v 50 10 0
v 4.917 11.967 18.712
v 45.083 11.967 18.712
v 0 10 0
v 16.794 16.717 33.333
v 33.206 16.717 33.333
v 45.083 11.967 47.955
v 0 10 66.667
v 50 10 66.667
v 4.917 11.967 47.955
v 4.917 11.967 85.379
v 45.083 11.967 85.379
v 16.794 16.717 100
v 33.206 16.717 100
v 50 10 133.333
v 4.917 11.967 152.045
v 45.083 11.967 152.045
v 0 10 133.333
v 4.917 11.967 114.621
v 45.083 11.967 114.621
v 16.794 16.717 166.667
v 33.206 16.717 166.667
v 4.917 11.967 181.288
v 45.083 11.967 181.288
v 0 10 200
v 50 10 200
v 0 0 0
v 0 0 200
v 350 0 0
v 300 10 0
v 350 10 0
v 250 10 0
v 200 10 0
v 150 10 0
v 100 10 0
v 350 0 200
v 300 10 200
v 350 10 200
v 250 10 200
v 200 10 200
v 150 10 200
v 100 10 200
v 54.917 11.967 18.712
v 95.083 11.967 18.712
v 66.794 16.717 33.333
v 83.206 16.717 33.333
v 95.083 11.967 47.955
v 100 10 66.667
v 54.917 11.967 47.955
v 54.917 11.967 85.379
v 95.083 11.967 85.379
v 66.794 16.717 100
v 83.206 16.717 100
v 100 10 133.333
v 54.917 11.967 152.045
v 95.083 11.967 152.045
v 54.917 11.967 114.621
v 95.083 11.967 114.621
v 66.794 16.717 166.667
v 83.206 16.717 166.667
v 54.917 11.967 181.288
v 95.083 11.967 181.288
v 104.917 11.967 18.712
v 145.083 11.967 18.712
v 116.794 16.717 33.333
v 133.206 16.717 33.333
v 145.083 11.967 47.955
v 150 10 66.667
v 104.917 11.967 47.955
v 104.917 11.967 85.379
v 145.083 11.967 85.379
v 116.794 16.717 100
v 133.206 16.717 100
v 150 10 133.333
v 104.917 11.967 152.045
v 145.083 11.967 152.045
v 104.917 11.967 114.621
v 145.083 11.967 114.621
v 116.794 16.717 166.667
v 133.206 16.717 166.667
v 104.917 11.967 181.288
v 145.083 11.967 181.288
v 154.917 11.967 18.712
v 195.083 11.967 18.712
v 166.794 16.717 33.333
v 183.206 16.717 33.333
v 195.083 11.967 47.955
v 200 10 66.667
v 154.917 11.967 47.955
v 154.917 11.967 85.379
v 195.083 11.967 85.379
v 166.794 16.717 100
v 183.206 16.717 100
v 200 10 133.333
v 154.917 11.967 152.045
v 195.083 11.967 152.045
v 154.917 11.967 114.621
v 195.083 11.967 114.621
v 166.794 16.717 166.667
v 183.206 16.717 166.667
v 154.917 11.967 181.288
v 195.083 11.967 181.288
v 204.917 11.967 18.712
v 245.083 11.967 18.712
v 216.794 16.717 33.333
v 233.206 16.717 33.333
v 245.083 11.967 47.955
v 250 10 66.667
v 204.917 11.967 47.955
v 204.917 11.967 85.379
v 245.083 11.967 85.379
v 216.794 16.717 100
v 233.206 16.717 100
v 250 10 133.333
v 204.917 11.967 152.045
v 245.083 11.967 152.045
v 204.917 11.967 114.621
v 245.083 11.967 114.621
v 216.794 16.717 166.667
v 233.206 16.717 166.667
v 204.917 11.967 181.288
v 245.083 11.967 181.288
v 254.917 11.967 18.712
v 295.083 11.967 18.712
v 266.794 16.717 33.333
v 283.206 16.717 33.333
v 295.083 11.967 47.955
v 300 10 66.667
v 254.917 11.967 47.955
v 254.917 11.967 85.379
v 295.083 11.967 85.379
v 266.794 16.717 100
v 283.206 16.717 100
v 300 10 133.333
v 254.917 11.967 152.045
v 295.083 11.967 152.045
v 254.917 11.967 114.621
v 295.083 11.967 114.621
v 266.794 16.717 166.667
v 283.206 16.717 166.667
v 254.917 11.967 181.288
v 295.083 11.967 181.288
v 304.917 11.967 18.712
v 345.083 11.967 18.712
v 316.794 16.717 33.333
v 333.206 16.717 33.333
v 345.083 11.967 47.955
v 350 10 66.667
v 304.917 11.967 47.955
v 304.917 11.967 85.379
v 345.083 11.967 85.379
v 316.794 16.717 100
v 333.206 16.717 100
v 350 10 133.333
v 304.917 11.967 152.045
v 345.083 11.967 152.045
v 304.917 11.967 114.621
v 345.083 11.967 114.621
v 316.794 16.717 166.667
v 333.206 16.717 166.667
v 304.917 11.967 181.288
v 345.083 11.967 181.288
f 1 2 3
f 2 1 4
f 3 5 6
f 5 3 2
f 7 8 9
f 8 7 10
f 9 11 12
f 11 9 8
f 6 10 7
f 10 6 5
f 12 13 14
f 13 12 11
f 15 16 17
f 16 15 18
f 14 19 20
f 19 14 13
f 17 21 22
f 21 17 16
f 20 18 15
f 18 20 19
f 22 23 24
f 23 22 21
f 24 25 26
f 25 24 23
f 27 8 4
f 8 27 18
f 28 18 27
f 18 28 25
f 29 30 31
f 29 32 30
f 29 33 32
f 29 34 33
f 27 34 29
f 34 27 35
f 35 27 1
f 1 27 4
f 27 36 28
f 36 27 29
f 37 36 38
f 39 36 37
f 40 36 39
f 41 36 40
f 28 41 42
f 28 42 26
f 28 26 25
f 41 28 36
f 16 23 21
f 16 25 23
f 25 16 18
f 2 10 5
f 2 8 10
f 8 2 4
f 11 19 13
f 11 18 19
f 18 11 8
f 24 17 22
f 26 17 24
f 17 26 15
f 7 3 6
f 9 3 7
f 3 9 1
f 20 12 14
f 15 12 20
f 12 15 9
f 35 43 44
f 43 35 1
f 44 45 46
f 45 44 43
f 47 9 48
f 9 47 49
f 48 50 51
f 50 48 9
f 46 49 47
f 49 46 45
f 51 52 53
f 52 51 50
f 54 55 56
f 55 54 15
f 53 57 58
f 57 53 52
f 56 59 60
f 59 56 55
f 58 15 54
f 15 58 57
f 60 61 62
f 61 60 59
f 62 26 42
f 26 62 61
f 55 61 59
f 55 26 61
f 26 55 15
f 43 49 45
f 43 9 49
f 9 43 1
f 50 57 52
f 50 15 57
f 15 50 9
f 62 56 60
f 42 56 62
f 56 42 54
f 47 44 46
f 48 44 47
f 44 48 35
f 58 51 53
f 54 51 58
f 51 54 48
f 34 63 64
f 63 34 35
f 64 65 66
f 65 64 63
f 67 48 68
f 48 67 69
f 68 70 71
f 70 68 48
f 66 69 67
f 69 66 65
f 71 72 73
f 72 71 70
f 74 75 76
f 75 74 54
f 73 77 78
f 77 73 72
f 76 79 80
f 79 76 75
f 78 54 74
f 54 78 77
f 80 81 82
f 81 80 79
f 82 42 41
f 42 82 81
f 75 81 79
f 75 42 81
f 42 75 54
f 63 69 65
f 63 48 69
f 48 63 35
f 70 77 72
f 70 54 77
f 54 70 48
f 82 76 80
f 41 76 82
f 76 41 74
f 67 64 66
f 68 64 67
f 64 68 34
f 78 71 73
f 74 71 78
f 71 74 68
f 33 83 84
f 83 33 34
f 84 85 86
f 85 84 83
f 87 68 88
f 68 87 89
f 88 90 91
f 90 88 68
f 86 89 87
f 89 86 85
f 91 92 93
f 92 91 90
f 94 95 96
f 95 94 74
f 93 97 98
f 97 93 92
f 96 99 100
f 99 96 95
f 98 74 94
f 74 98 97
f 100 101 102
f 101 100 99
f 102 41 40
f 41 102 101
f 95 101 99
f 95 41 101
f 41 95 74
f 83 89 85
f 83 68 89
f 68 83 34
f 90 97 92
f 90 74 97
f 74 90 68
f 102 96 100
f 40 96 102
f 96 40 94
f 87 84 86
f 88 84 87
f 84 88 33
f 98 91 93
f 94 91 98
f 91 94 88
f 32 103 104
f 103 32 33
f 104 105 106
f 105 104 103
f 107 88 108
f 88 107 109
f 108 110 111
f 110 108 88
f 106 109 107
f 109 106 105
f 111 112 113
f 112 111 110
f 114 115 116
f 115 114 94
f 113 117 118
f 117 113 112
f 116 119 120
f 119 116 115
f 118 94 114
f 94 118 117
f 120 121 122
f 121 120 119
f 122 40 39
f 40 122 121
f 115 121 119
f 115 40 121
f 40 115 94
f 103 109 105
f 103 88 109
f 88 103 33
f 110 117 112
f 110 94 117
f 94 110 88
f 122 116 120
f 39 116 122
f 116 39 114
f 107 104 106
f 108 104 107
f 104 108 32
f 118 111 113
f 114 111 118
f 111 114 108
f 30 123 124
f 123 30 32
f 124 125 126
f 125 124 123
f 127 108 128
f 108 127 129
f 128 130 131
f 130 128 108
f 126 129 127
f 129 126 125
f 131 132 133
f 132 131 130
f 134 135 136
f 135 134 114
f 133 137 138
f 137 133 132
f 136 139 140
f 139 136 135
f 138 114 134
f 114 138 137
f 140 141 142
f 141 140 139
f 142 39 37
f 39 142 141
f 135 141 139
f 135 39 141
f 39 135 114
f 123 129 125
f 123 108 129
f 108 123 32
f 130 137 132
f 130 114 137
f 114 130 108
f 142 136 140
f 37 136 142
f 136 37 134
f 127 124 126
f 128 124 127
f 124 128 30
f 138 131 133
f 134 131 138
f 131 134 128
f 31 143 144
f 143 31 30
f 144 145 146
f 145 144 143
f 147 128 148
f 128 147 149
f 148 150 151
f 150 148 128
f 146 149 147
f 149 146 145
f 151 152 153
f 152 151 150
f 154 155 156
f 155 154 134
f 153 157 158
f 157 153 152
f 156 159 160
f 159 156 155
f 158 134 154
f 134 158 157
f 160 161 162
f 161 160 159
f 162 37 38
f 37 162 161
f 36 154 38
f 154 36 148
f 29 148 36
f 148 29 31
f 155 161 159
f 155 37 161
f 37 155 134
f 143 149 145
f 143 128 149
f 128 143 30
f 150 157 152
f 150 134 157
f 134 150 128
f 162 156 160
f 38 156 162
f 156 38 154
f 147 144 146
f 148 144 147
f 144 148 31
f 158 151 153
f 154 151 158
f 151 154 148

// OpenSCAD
width_lane=50;
thickness_base=10;
thickness_top=20;
length_lane=200;
nb_cylinders=3;
//cylinder_radius=(length_lane/nb_cylinders)/2;
cylinder_radius=90;
nb_lanes=6;


bottom_lane=[[0,0],
    [width_lane,0],
    [width_lane,thickness_base],
    [width_lane/2,thickness_top],
    [0,thickness_base]];
module lane() {
difference() {
    linear_extrude(height = length_lane,
            center = false,
            convexity = 0,
            twist = 0) {
        polygon(bottom_lane);
    }

    for (a=[0:nb_cylinders]) {
        echo(a);
        translate([0,
                cylinder_radius+thickness_base,
                (length_lane/nb_cylinders)*a]) {
             rotate(a=[90,0,90]) {
                cylinder(h = width_lane,
                    r1 = cylinder_radius,
                    r2 = cylinder_radius,
                    center = true/false);
            }
        }
    }
}
}
for (a=[0:nb_lanes]) {
    translate([a*width_lane,0,0]) {
        lane();
    }
}
